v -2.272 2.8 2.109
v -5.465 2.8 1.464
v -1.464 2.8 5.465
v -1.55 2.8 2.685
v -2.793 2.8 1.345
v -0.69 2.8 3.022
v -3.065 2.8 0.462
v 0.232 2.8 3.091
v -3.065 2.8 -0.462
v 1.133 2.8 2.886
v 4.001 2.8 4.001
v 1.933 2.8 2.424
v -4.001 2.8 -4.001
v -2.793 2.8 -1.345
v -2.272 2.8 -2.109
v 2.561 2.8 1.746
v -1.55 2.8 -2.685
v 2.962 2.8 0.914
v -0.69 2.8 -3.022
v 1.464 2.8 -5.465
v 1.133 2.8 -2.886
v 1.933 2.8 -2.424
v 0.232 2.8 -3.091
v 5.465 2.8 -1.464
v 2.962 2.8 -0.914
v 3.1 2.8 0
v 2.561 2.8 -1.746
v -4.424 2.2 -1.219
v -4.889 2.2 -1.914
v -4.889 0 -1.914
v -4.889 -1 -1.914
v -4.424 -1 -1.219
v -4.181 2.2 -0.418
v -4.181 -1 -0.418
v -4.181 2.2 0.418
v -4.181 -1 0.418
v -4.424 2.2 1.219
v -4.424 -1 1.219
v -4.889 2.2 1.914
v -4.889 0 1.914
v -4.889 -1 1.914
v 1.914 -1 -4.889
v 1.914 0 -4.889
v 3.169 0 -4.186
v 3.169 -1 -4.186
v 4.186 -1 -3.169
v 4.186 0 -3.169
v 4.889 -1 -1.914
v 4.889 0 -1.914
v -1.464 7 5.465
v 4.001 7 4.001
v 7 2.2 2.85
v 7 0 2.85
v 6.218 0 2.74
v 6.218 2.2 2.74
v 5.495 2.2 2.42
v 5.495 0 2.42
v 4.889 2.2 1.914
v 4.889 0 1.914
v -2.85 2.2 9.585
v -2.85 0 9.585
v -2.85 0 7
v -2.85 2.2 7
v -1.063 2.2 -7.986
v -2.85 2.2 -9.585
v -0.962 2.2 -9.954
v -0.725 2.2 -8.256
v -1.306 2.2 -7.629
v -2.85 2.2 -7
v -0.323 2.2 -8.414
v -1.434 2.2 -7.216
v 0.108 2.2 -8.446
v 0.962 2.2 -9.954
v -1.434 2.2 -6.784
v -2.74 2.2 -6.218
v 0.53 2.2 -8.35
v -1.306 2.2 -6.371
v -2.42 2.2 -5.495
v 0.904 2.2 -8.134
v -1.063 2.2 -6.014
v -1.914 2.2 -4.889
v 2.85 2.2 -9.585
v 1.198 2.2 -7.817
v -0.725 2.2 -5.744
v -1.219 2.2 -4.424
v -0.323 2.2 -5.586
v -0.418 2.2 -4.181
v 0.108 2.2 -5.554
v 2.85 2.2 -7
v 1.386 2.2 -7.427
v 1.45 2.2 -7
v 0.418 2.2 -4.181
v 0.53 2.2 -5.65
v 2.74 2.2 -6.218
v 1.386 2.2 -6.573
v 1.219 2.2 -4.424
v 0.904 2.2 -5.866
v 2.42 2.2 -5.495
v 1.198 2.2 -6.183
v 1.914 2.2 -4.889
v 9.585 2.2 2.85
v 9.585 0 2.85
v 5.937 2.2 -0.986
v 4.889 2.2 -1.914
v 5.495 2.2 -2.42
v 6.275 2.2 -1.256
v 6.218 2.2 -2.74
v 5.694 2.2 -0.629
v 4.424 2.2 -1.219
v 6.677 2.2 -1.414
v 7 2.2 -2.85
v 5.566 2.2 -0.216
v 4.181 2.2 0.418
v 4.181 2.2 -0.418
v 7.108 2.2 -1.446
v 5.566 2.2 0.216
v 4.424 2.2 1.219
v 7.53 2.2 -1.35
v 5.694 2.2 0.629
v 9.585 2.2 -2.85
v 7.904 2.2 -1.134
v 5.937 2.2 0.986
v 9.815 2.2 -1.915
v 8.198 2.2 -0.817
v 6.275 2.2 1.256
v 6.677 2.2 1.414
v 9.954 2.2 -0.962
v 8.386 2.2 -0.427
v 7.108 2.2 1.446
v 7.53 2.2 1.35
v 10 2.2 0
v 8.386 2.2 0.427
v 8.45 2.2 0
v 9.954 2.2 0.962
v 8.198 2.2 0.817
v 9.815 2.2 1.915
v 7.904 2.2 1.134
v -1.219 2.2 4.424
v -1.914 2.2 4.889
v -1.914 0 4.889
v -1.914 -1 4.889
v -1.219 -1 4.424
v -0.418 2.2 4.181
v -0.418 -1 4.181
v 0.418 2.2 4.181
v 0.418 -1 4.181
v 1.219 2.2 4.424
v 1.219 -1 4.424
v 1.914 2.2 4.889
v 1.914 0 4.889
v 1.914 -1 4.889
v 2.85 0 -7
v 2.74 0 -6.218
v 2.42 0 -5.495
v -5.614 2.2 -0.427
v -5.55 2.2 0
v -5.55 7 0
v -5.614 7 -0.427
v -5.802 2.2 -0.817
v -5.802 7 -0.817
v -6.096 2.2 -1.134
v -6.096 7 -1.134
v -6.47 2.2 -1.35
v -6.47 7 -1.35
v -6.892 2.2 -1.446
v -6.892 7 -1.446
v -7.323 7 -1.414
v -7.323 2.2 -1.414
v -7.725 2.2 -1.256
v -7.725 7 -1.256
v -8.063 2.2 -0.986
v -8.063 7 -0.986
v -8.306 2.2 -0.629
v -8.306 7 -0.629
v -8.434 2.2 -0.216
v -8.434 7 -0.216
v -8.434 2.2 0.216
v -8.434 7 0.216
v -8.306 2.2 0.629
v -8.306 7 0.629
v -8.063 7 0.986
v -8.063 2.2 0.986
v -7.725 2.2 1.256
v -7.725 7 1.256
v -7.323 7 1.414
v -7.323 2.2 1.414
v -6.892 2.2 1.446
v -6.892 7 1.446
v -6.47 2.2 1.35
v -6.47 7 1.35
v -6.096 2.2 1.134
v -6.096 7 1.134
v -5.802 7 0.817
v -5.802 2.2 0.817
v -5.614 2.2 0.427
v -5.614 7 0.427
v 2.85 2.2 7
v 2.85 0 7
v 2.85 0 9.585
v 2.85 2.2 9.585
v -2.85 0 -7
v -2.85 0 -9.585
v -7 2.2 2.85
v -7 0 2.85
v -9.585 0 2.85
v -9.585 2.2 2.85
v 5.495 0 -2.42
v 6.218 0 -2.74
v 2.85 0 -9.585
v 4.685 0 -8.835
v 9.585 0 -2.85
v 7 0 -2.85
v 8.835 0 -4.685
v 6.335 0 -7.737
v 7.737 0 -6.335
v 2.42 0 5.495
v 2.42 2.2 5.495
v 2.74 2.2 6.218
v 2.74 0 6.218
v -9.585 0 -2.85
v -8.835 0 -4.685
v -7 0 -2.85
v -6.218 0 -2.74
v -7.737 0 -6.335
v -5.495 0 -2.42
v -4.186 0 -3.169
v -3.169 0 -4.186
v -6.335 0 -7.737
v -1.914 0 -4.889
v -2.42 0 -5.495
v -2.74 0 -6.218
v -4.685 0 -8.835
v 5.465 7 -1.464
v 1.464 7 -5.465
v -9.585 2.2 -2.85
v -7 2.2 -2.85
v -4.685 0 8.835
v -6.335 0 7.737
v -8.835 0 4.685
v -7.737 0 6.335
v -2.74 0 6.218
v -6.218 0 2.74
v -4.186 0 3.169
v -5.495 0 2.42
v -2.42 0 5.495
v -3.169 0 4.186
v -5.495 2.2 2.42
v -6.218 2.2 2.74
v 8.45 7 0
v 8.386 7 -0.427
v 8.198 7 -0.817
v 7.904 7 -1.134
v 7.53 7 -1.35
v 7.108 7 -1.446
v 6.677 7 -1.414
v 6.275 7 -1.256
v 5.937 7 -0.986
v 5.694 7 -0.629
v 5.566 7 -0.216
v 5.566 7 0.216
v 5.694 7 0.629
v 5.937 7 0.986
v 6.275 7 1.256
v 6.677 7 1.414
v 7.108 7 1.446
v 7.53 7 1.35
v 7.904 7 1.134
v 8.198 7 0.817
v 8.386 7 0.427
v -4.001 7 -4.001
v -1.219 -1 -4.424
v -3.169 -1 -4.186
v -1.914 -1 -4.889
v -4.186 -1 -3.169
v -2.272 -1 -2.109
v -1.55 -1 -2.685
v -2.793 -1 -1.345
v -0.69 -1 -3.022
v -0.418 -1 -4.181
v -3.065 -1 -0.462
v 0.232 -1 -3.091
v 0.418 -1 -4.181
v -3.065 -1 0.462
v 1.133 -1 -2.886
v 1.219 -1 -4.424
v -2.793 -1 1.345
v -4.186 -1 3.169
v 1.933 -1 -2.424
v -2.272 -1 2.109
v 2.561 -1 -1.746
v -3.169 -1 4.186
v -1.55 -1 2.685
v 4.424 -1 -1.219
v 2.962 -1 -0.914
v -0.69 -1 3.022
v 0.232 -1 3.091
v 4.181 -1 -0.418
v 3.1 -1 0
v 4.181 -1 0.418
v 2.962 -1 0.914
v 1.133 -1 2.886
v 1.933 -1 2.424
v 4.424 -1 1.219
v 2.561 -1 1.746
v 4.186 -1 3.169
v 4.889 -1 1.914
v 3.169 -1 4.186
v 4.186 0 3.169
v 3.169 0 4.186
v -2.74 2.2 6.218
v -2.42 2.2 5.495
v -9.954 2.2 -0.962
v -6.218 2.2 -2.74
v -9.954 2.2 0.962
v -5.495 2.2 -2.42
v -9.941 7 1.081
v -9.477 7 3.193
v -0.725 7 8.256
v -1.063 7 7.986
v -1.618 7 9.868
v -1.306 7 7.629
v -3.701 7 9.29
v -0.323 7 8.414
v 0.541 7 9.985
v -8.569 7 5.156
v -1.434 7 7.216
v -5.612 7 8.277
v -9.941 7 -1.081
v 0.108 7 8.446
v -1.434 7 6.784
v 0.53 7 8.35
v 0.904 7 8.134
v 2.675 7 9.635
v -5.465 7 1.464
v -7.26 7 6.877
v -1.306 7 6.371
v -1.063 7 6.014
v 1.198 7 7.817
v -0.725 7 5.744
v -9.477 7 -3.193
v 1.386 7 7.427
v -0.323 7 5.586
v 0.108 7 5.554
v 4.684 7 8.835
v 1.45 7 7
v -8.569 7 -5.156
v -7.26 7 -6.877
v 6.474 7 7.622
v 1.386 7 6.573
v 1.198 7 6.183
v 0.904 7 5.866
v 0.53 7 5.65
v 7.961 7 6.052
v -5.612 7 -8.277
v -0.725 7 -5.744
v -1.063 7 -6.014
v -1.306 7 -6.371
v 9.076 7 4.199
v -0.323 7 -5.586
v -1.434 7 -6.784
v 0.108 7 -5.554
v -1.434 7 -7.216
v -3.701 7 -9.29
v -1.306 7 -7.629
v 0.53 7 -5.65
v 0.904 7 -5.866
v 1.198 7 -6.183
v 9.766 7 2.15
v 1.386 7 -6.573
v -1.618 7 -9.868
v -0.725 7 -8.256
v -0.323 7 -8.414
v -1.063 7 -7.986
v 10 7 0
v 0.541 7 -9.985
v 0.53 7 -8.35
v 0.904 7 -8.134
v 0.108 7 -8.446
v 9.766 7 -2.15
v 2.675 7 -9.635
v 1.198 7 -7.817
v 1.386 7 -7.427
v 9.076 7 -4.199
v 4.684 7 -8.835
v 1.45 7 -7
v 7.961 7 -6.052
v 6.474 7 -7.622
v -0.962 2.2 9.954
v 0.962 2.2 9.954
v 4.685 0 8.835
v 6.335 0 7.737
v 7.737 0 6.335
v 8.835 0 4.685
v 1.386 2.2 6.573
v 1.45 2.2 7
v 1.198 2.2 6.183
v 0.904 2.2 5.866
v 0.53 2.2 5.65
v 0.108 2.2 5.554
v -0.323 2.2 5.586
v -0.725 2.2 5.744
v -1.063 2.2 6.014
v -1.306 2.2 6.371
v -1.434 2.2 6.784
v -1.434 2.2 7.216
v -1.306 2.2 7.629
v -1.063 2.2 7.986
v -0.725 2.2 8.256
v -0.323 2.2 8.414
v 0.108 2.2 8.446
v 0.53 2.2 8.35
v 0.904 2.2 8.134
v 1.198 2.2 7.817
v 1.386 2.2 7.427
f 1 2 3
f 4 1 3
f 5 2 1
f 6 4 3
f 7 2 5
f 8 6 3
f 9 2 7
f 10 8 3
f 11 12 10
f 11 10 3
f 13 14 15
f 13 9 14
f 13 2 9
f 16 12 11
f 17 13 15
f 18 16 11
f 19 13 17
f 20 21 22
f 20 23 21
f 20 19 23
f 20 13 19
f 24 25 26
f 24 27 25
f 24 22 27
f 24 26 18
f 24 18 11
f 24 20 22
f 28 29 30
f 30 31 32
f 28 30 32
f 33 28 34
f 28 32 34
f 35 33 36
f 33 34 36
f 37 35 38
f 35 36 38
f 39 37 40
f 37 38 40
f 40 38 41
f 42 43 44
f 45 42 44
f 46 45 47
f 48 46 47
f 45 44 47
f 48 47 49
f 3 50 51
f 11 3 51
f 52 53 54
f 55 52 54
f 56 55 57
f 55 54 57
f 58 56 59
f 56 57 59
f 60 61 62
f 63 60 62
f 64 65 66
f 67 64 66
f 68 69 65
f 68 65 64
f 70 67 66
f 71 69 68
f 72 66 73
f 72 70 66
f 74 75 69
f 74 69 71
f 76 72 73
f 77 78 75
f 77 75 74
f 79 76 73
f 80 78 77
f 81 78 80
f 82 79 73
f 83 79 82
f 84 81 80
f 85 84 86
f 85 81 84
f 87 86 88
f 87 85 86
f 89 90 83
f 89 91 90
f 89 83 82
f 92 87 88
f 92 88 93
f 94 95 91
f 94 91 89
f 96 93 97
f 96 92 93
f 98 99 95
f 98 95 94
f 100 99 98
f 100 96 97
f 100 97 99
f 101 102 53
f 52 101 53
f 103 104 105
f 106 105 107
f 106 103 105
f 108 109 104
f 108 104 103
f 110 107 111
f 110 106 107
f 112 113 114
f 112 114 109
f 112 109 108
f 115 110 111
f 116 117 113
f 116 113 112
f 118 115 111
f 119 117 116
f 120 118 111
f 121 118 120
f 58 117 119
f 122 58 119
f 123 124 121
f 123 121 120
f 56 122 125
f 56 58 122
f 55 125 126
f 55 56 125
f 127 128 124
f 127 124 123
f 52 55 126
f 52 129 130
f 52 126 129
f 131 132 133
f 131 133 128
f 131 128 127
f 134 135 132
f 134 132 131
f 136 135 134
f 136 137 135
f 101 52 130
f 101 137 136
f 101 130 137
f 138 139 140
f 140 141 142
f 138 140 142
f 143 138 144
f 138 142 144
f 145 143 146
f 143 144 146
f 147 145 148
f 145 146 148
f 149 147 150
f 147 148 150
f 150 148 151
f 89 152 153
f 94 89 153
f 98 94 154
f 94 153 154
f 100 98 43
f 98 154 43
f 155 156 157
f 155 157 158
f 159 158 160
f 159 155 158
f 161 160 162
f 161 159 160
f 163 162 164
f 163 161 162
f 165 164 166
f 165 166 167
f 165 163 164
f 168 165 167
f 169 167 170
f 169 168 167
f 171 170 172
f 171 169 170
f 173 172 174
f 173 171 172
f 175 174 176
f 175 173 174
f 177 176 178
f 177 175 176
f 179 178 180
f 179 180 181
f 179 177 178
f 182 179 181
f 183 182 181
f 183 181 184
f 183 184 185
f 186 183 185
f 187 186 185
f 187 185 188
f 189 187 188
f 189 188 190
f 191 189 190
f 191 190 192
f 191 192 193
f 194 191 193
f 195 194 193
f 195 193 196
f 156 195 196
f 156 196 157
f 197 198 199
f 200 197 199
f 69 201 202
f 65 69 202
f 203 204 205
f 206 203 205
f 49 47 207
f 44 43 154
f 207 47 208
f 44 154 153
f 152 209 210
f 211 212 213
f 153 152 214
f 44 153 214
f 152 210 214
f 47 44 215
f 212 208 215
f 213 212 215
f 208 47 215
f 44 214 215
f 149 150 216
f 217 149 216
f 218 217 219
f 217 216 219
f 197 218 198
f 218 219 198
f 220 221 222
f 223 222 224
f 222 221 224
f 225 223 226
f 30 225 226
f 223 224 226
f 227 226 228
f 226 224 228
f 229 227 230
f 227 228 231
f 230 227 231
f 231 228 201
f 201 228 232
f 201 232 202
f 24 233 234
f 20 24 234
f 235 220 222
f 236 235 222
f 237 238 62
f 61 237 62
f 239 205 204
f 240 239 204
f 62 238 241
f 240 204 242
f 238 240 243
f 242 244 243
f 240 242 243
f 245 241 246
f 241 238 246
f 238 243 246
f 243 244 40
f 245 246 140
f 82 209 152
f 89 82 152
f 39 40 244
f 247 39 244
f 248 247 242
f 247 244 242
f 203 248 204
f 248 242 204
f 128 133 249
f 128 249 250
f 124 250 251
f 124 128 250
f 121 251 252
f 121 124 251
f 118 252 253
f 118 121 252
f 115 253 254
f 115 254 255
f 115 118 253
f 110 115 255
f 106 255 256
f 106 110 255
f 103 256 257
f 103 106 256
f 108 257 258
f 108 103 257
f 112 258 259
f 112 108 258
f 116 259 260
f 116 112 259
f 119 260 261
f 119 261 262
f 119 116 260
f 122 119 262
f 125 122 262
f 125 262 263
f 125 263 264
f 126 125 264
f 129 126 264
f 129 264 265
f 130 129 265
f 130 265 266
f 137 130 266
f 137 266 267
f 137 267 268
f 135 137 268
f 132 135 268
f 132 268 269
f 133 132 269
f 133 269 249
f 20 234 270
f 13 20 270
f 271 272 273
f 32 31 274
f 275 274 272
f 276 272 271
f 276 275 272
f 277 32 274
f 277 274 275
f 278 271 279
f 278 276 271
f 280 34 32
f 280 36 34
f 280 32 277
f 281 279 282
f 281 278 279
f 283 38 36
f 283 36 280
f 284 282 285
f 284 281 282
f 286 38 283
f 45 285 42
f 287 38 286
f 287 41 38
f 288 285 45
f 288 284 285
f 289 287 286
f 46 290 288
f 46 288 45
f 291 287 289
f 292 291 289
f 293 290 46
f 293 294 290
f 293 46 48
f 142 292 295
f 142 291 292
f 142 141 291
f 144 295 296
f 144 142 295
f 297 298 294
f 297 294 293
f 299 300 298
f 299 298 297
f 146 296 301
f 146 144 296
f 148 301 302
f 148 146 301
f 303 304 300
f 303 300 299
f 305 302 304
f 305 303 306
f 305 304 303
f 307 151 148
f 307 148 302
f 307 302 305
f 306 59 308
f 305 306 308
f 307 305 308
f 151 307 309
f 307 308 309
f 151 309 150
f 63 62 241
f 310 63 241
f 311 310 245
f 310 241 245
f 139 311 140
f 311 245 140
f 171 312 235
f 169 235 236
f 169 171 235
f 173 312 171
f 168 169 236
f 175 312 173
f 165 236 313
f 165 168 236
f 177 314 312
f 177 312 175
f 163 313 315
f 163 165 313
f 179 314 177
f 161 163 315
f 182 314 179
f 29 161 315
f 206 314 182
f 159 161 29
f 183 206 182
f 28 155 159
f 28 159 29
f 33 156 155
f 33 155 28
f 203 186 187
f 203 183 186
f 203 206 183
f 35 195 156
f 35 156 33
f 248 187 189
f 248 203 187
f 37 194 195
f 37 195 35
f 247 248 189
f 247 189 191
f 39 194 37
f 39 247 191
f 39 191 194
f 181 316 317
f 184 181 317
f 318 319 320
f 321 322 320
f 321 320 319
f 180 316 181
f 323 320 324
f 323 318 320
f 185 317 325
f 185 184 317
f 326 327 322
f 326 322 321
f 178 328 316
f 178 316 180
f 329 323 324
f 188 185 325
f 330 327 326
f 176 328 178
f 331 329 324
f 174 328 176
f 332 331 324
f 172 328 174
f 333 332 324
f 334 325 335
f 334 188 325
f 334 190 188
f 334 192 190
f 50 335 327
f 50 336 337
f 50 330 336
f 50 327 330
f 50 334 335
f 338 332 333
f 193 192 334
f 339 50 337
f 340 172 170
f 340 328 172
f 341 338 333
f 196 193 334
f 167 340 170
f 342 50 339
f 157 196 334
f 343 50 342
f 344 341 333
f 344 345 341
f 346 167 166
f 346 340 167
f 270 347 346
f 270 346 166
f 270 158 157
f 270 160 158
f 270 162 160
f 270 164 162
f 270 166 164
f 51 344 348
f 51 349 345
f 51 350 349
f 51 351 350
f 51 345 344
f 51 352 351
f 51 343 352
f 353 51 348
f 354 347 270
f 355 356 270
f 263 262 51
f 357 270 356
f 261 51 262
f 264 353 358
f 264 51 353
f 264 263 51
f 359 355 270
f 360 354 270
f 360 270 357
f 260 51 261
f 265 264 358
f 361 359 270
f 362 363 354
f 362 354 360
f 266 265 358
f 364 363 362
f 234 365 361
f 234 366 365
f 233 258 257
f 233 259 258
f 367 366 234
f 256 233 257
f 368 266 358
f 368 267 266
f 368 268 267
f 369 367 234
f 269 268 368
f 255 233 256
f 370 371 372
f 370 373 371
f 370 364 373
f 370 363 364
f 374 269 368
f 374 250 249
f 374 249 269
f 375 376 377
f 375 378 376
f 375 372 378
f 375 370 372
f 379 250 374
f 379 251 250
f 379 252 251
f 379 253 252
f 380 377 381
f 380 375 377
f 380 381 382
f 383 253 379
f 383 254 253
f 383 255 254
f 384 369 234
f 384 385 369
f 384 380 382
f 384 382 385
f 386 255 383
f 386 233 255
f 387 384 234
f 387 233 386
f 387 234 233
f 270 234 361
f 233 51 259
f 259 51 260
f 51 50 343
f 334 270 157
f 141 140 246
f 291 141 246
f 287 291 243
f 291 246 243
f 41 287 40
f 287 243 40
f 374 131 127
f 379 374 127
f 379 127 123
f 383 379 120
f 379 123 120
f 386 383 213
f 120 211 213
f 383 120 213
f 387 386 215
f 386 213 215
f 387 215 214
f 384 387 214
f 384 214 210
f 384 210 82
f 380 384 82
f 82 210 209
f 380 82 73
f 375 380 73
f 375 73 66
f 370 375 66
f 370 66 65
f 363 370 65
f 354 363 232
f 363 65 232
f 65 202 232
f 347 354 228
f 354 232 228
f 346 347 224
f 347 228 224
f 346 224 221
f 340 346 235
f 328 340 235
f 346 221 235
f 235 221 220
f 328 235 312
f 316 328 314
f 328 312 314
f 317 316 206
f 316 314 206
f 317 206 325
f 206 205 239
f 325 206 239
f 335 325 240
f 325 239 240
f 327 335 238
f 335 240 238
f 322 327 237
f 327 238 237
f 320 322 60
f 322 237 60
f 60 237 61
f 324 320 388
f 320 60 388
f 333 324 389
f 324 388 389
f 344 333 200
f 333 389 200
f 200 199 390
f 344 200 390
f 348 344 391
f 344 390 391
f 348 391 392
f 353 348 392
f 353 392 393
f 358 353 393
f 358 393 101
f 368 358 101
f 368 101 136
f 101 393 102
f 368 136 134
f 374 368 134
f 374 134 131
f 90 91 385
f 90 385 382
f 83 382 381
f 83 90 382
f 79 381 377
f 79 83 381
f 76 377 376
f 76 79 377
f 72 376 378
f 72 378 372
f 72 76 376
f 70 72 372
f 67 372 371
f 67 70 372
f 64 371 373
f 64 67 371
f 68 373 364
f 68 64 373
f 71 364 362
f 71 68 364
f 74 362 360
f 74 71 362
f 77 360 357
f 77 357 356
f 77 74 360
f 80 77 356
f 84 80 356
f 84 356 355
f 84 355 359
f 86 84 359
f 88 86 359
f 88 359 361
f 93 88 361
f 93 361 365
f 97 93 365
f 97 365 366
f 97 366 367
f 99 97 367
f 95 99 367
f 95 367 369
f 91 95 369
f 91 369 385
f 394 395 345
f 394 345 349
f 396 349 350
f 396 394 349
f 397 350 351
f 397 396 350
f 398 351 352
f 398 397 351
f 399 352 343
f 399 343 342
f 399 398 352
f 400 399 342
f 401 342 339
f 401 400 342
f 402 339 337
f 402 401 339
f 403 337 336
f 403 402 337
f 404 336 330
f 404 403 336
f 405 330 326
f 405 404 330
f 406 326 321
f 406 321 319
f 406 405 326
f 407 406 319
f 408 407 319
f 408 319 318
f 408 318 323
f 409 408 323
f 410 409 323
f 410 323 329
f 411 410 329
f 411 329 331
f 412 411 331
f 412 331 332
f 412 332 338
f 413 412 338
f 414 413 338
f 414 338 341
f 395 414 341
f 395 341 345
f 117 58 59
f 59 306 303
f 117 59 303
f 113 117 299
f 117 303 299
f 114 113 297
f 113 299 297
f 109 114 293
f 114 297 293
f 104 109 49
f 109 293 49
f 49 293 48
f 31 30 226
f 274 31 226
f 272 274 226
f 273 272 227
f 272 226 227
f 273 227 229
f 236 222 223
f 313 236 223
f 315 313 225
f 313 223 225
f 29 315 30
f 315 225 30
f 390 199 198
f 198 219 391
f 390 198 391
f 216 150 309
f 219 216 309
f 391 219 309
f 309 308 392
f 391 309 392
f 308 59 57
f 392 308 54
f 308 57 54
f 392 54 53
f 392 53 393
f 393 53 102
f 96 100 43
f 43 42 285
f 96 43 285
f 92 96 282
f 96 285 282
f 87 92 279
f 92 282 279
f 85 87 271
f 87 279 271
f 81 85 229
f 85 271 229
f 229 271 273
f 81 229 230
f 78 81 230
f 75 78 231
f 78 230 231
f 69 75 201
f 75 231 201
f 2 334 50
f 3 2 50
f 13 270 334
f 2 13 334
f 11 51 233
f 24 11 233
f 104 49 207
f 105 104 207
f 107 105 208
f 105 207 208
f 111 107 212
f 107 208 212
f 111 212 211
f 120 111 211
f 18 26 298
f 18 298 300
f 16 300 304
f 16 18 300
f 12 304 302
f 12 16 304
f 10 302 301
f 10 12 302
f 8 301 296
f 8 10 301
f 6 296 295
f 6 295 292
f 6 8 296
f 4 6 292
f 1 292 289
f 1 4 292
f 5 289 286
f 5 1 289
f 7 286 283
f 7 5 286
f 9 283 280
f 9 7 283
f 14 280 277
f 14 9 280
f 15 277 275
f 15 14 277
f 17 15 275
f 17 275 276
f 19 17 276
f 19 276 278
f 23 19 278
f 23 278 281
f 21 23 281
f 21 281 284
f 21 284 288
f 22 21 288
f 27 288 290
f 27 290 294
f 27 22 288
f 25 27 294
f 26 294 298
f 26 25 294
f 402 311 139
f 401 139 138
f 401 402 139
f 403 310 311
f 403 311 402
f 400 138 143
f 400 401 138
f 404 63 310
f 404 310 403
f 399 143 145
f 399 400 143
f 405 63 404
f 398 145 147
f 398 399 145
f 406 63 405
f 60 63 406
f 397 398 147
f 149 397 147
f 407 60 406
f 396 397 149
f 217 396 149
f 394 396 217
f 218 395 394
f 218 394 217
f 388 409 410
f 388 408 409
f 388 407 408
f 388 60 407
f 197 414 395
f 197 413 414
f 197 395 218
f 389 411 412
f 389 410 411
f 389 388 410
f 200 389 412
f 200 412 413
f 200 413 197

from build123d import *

# Parameters (mm, degrees)
SKETCH1_R           = 10
SKETCH1_R_2         = 3.1
SKETCH1_R_3         = 1.45
BOSS_EXTRUDE1_DEPTH = 7
SKETCH8_R           = 5.25
SKETCH8_R_2         = 3.1
BOSS_EXTRUDE4_DEPTH = 1
CUT_EXTRUDE1_DEPTH  = 3.2
CUT_EXTRUDE2_DEPTH  = 4.2


with BuildPart() as part:
    # Sketch1 → Boss-Extrude1 (new body)
    with BuildSketch(Plane(origin=(0, 0, 0), x_dir=(1, 0, 0), z_dir=(0, 1, 0))):
        Circle(SKETCH1_R)
        Circle(SKETCH1_R_2, mode=Mode.SUBTRACT)
        with Locations((0, 7)):
            Circle(SKETCH1_R_3, mode=Mode.SUBTRACT)
        with Locations((7, 0)):
            Circle(SKETCH1_R_3, mode=Mode.SUBTRACT)
        with Locations((0, -7)):
            Circle(SKETCH1_R_3, mode=Mode.SUBTRACT)
        with Locations((-7, 0)):
            Circle(SKETCH1_R_3, mode=Mode.SUBTRACT)
    extrude(amount=BOSS_EXTRUDE1_DEPTH)

    # Sketch8 → Boss-Extrude4 (add)
    with BuildSketch(Plane.XZ):
        Circle(SKETCH8_R)
        Circle(SKETCH8_R_2, mode=Mode.SUBTRACT)
    extrude(amount=BOSS_EXTRUDE4_DEPTH)

    # Sketch9 → Cut-Extrude1 (cut)
    with BuildSketch(Plane.XZ.offset(1)):
        with BuildLine():
            Line((-7, 2.85), (-9.585275166, 2.85))
            ThreePointArc((-9.585275166, 2.85), (-10, 0), (-9.585275166, -2.85))
            Line((-9.585275166, -2.85), (-7, -2.85))
            ThreePointArc((-7, -2.85), (-5.845254282, -2.605582915), (-4.888571429, -1.914254264))
            ThreePointArc((-4.888571429, -1.914254264), (-5.25, 0), (-4.888571429, 1.914254264))
            ThreePointArc((-4.888571429, 1.914254264), (-5.845254282, 2.605582915), (-7, 2.85))
        make_face()
        with BuildLine():
            Line((-2.85, 9.585275166), (-2.85, 7))
            ThreePointArc((-2.85, 7), (-2.605582915, 5.845254282), (-1.914254264, 4.888571429))
            ThreePointArc((-1.914254264, 4.888571429), (0, 5.25), (1.914254264, 4.888571429))
            ThreePointArc((1.914254264, 4.888571429), (2.605582915, 5.845254282), (2.85, 7))
            Line((2.85, 7), (2.85, 9.585275166))
            ThreePointArc((2.85, 9.585275166), (0, 10), (-2.85, 9.585275166))
        make_face()
        with BuildLine():
            ThreePointArc((10, 0), (9.895775656, 1.440008393), (9.585275166, 2.85))
            Line((9.585275166, 2.85), (7, 2.85))
            ThreePointArc((7, 2.85), (5.845254282, 2.605582915), (4.888571429, 1.914254264))
            ThreePointArc((4.888571429, 1.914254264), (5.158851616, 0.974037987), (5.25, 0))
            ThreePointArc((5.25, 0), (5.158851616, -0.974037987), (4.888571429, -1.914254264))
            ThreePointArc((4.888571429, -1.914254264), (5.845254282, -2.605582915), (7, -2.85))
            Line((7, -2.85), (9.585275166, -2.85))
            ThreePointArc((9.585275166, -2.85), (9.895775656, -1.440008393), (10, 0))
        make_face()
        with BuildLine():
            Line((-2.85, -7), (-2.85, -9.585275166))
            ThreePointArc((-2.85, -9.585275166), (0, -10), (2.85, -9.585275166))
            Line((2.85, -9.585275166), (2.85, -7))
            ThreePointArc((2.85, -7), (2.605582915, -5.845254282), (1.914254264, -4.888571429))
            ThreePointArc((1.914254264, -4.888571429), (0, -5.25), (-1.914254264, -4.888571429))
            ThreePointArc((-1.914254264, -4.888571429), (-2.605582915, -5.845254282), (-2.85, -7))
        make_face()
        with BuildLine():
            ThreePointArc((-4.888571429, -1.914254264), (-4.15, 0), (-4.888571429, 1.914254264))
            ThreePointArc((-4.888571429, 1.914254264), (-5.25, 0), (-4.888571429, -1.914254264))
        make_face()
        with BuildLine():
            ThreePointArc((1.914254264, 4.888571429), (0, 5.25), (-1.914254264, 4.888571429))
            ThreePointArc((-1.914254264, 4.888571429), (0, 4.15), (1.914254264, 4.888571429))
        make_face()
        with BuildLine():
            ThreePointArc((5.25, 0), (5.158851616, 0.974037987), (4.888571429, 1.914254264))
            ThreePointArc((4.888571429, 1.914254264), (4.15, 0), (4.888571429, -1.914254264))
            ThreePointArc((4.888571429, -1.914254264), (5.158851616, -0.974037987), (5.25, 0))
        make_face()
        with BuildLine():
            ThreePointArc((1.914254264, -4.888571429), (0, -4.15), (-1.914254264, -4.888571429))
            ThreePointArc((-1.914254264, -4.888571429), (0, -5.25), (1.914254264, -4.888571429))
        make_face()
    extrude(amount=-CUT_EXTRUDE1_DEPTH, mode=Mode.SUBTRACT)

    # Sketch10 → Cut-Extrude2 (cut)
    with BuildSketch(Plane(origin=(0, 7, 0), x_dir=(1, 0, 0), z_dir=(0, 1, 0))):
        Polygon((1.464406605, 5.465239851), (-4.000833247, 4.000833247), (-5.465239851, -1.464406605), (-1.464406605, -5.465239851), (4.000833247, -4.000833247), (5.465239851, 1.464406605), align=None)
    extrude(amount=-CUT_EXTRUDE2_DEPTH, mode=Mode.SUBTRACT)


solid = part.part
